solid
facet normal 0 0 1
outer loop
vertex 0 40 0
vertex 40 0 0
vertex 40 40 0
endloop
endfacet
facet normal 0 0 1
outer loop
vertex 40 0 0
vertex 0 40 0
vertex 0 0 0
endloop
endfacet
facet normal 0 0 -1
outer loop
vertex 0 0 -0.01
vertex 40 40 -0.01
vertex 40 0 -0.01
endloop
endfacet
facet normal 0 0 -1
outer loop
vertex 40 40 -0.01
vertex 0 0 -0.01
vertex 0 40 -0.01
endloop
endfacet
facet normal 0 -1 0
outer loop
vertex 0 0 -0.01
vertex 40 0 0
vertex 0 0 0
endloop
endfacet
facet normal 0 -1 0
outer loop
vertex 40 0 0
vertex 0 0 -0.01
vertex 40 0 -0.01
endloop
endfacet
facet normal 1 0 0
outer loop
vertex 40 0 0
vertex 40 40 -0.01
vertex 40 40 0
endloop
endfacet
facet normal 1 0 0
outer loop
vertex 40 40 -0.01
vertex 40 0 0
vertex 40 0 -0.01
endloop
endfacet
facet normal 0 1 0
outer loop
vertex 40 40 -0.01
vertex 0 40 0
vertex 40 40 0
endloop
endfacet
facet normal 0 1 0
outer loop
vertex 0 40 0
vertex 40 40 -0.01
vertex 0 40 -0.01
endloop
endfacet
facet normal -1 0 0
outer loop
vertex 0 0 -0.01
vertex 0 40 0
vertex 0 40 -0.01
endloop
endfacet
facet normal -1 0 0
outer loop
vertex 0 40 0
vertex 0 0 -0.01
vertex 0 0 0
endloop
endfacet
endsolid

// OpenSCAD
translate([0,0,-0.01]) color([0.1,0.1,0.1]) cube([40,40,0.01]);
